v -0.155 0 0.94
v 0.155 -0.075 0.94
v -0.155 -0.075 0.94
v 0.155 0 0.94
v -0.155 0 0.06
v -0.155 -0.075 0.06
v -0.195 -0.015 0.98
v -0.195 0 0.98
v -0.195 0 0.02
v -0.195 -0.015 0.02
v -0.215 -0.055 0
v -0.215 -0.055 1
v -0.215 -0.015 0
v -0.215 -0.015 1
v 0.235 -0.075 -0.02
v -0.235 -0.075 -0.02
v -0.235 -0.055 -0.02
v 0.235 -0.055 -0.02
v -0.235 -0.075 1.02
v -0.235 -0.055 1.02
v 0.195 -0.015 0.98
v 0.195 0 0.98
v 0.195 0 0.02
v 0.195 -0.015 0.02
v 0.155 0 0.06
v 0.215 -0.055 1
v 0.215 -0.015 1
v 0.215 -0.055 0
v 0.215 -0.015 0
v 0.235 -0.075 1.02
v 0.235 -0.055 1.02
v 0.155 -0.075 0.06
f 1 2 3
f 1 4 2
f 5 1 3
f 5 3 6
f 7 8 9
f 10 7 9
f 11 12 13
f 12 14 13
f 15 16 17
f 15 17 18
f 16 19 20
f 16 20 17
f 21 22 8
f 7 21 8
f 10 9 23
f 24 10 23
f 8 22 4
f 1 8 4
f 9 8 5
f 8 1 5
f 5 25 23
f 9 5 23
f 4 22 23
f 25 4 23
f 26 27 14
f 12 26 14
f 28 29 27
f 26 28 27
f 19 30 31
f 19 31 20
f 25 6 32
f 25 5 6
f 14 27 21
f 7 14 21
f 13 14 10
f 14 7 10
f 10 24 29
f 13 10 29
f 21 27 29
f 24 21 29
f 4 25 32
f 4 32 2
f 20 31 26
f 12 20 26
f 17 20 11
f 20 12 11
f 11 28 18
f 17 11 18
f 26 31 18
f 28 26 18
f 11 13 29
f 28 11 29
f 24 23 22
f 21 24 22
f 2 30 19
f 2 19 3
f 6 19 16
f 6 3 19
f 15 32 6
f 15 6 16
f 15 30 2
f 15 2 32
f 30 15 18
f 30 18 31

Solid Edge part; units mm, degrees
sketch "Sketch1" plane through (0, 0, 0) normal (0, -1, 0) x (1, 0, 0)
  line L0 (-0.215, 0) -> (0.215, 0)
  line L1 (0.215, 0) -> (0.215, 1)
  line L2 (0.215, 1) -> (-0.215, 1)
  line L3 (-0.215, 1) -> (-0.215, 0)
  dimension "D1" = 1
  dimension "D2" = 0.43
extrude "Protrusion1" add sketch "Sketch1" along normal blind 0.075
sketch "Sketch2" plane through (0, 0, 0.69) normal (0, 1, 0) x (-1, 0, 0)
  line L0 (-0.155, 0.25) -> (0.155, 0.25)
  line L1 (0.155, 0.25) -> (0.155, -0.63)
  line L2 (0.155, -0.63) -> (-0.155, -0.63)
  line L3 (-0.155, -0.63) -> (-0.155, 0.25)
extrude "Cutout1" cut sketch "Sketch2" against normal up to next
sketch "Sketch3" plane through (0, 0, 0.69) normal (0, 1, 0) x (-1, 0, 0)
  line L0 (-0.195, -0.67) -> (-0.195, 0.29)
  line L1 (-0.195, 0.29) -> (0.195, 0.29)
  line L2 (0.195, 0.29) -> (0.195, -0.67)
  line L3 (0.195, -0.67) -> (-0.195, -0.67)
  line L4 (-0.215, -0.69) -> (-0.215, 0.31)
  line L5 (-0.215, 0.31) -> (0.215, 0.31)
  line L6 (0.215, 0.31) -> (0.215, -0.69)
  line L7 (0.215, -0.69) -> (-0.215, -0.69)
extrude "Ausschnitt_1" cut sketch "Sketch3" against normal blind 0.015
sketch "Sketch4" plane through (0, -0.075, 0.69) normal (0, -1, 0) x (1, 0, 0)
  line L0 (-0.235, 0.33) -> (-0.235, -0.71)
  line L1 (-0.235, -0.71) -> (0.235, -0.71)
  line L2 (0.235, -0.71) -> (0.235, 0.33)
  line L3 (0.235, 0.33) -> (-0.235, 0.33)
  line L4 (0.215, 0.31) -> (-0.215, 0.31)
  line L5 (-0.215, 0.31) -> (-0.215, -0.69)
  line L6 (-0.215, -0.69) -> (0.215, -0.69)
  line L7 (0.215, -0.69) -> (0.215, 0.31)
extrude "Ausprägung_2" add sketch "Sketch4" against normal blind 0.02
